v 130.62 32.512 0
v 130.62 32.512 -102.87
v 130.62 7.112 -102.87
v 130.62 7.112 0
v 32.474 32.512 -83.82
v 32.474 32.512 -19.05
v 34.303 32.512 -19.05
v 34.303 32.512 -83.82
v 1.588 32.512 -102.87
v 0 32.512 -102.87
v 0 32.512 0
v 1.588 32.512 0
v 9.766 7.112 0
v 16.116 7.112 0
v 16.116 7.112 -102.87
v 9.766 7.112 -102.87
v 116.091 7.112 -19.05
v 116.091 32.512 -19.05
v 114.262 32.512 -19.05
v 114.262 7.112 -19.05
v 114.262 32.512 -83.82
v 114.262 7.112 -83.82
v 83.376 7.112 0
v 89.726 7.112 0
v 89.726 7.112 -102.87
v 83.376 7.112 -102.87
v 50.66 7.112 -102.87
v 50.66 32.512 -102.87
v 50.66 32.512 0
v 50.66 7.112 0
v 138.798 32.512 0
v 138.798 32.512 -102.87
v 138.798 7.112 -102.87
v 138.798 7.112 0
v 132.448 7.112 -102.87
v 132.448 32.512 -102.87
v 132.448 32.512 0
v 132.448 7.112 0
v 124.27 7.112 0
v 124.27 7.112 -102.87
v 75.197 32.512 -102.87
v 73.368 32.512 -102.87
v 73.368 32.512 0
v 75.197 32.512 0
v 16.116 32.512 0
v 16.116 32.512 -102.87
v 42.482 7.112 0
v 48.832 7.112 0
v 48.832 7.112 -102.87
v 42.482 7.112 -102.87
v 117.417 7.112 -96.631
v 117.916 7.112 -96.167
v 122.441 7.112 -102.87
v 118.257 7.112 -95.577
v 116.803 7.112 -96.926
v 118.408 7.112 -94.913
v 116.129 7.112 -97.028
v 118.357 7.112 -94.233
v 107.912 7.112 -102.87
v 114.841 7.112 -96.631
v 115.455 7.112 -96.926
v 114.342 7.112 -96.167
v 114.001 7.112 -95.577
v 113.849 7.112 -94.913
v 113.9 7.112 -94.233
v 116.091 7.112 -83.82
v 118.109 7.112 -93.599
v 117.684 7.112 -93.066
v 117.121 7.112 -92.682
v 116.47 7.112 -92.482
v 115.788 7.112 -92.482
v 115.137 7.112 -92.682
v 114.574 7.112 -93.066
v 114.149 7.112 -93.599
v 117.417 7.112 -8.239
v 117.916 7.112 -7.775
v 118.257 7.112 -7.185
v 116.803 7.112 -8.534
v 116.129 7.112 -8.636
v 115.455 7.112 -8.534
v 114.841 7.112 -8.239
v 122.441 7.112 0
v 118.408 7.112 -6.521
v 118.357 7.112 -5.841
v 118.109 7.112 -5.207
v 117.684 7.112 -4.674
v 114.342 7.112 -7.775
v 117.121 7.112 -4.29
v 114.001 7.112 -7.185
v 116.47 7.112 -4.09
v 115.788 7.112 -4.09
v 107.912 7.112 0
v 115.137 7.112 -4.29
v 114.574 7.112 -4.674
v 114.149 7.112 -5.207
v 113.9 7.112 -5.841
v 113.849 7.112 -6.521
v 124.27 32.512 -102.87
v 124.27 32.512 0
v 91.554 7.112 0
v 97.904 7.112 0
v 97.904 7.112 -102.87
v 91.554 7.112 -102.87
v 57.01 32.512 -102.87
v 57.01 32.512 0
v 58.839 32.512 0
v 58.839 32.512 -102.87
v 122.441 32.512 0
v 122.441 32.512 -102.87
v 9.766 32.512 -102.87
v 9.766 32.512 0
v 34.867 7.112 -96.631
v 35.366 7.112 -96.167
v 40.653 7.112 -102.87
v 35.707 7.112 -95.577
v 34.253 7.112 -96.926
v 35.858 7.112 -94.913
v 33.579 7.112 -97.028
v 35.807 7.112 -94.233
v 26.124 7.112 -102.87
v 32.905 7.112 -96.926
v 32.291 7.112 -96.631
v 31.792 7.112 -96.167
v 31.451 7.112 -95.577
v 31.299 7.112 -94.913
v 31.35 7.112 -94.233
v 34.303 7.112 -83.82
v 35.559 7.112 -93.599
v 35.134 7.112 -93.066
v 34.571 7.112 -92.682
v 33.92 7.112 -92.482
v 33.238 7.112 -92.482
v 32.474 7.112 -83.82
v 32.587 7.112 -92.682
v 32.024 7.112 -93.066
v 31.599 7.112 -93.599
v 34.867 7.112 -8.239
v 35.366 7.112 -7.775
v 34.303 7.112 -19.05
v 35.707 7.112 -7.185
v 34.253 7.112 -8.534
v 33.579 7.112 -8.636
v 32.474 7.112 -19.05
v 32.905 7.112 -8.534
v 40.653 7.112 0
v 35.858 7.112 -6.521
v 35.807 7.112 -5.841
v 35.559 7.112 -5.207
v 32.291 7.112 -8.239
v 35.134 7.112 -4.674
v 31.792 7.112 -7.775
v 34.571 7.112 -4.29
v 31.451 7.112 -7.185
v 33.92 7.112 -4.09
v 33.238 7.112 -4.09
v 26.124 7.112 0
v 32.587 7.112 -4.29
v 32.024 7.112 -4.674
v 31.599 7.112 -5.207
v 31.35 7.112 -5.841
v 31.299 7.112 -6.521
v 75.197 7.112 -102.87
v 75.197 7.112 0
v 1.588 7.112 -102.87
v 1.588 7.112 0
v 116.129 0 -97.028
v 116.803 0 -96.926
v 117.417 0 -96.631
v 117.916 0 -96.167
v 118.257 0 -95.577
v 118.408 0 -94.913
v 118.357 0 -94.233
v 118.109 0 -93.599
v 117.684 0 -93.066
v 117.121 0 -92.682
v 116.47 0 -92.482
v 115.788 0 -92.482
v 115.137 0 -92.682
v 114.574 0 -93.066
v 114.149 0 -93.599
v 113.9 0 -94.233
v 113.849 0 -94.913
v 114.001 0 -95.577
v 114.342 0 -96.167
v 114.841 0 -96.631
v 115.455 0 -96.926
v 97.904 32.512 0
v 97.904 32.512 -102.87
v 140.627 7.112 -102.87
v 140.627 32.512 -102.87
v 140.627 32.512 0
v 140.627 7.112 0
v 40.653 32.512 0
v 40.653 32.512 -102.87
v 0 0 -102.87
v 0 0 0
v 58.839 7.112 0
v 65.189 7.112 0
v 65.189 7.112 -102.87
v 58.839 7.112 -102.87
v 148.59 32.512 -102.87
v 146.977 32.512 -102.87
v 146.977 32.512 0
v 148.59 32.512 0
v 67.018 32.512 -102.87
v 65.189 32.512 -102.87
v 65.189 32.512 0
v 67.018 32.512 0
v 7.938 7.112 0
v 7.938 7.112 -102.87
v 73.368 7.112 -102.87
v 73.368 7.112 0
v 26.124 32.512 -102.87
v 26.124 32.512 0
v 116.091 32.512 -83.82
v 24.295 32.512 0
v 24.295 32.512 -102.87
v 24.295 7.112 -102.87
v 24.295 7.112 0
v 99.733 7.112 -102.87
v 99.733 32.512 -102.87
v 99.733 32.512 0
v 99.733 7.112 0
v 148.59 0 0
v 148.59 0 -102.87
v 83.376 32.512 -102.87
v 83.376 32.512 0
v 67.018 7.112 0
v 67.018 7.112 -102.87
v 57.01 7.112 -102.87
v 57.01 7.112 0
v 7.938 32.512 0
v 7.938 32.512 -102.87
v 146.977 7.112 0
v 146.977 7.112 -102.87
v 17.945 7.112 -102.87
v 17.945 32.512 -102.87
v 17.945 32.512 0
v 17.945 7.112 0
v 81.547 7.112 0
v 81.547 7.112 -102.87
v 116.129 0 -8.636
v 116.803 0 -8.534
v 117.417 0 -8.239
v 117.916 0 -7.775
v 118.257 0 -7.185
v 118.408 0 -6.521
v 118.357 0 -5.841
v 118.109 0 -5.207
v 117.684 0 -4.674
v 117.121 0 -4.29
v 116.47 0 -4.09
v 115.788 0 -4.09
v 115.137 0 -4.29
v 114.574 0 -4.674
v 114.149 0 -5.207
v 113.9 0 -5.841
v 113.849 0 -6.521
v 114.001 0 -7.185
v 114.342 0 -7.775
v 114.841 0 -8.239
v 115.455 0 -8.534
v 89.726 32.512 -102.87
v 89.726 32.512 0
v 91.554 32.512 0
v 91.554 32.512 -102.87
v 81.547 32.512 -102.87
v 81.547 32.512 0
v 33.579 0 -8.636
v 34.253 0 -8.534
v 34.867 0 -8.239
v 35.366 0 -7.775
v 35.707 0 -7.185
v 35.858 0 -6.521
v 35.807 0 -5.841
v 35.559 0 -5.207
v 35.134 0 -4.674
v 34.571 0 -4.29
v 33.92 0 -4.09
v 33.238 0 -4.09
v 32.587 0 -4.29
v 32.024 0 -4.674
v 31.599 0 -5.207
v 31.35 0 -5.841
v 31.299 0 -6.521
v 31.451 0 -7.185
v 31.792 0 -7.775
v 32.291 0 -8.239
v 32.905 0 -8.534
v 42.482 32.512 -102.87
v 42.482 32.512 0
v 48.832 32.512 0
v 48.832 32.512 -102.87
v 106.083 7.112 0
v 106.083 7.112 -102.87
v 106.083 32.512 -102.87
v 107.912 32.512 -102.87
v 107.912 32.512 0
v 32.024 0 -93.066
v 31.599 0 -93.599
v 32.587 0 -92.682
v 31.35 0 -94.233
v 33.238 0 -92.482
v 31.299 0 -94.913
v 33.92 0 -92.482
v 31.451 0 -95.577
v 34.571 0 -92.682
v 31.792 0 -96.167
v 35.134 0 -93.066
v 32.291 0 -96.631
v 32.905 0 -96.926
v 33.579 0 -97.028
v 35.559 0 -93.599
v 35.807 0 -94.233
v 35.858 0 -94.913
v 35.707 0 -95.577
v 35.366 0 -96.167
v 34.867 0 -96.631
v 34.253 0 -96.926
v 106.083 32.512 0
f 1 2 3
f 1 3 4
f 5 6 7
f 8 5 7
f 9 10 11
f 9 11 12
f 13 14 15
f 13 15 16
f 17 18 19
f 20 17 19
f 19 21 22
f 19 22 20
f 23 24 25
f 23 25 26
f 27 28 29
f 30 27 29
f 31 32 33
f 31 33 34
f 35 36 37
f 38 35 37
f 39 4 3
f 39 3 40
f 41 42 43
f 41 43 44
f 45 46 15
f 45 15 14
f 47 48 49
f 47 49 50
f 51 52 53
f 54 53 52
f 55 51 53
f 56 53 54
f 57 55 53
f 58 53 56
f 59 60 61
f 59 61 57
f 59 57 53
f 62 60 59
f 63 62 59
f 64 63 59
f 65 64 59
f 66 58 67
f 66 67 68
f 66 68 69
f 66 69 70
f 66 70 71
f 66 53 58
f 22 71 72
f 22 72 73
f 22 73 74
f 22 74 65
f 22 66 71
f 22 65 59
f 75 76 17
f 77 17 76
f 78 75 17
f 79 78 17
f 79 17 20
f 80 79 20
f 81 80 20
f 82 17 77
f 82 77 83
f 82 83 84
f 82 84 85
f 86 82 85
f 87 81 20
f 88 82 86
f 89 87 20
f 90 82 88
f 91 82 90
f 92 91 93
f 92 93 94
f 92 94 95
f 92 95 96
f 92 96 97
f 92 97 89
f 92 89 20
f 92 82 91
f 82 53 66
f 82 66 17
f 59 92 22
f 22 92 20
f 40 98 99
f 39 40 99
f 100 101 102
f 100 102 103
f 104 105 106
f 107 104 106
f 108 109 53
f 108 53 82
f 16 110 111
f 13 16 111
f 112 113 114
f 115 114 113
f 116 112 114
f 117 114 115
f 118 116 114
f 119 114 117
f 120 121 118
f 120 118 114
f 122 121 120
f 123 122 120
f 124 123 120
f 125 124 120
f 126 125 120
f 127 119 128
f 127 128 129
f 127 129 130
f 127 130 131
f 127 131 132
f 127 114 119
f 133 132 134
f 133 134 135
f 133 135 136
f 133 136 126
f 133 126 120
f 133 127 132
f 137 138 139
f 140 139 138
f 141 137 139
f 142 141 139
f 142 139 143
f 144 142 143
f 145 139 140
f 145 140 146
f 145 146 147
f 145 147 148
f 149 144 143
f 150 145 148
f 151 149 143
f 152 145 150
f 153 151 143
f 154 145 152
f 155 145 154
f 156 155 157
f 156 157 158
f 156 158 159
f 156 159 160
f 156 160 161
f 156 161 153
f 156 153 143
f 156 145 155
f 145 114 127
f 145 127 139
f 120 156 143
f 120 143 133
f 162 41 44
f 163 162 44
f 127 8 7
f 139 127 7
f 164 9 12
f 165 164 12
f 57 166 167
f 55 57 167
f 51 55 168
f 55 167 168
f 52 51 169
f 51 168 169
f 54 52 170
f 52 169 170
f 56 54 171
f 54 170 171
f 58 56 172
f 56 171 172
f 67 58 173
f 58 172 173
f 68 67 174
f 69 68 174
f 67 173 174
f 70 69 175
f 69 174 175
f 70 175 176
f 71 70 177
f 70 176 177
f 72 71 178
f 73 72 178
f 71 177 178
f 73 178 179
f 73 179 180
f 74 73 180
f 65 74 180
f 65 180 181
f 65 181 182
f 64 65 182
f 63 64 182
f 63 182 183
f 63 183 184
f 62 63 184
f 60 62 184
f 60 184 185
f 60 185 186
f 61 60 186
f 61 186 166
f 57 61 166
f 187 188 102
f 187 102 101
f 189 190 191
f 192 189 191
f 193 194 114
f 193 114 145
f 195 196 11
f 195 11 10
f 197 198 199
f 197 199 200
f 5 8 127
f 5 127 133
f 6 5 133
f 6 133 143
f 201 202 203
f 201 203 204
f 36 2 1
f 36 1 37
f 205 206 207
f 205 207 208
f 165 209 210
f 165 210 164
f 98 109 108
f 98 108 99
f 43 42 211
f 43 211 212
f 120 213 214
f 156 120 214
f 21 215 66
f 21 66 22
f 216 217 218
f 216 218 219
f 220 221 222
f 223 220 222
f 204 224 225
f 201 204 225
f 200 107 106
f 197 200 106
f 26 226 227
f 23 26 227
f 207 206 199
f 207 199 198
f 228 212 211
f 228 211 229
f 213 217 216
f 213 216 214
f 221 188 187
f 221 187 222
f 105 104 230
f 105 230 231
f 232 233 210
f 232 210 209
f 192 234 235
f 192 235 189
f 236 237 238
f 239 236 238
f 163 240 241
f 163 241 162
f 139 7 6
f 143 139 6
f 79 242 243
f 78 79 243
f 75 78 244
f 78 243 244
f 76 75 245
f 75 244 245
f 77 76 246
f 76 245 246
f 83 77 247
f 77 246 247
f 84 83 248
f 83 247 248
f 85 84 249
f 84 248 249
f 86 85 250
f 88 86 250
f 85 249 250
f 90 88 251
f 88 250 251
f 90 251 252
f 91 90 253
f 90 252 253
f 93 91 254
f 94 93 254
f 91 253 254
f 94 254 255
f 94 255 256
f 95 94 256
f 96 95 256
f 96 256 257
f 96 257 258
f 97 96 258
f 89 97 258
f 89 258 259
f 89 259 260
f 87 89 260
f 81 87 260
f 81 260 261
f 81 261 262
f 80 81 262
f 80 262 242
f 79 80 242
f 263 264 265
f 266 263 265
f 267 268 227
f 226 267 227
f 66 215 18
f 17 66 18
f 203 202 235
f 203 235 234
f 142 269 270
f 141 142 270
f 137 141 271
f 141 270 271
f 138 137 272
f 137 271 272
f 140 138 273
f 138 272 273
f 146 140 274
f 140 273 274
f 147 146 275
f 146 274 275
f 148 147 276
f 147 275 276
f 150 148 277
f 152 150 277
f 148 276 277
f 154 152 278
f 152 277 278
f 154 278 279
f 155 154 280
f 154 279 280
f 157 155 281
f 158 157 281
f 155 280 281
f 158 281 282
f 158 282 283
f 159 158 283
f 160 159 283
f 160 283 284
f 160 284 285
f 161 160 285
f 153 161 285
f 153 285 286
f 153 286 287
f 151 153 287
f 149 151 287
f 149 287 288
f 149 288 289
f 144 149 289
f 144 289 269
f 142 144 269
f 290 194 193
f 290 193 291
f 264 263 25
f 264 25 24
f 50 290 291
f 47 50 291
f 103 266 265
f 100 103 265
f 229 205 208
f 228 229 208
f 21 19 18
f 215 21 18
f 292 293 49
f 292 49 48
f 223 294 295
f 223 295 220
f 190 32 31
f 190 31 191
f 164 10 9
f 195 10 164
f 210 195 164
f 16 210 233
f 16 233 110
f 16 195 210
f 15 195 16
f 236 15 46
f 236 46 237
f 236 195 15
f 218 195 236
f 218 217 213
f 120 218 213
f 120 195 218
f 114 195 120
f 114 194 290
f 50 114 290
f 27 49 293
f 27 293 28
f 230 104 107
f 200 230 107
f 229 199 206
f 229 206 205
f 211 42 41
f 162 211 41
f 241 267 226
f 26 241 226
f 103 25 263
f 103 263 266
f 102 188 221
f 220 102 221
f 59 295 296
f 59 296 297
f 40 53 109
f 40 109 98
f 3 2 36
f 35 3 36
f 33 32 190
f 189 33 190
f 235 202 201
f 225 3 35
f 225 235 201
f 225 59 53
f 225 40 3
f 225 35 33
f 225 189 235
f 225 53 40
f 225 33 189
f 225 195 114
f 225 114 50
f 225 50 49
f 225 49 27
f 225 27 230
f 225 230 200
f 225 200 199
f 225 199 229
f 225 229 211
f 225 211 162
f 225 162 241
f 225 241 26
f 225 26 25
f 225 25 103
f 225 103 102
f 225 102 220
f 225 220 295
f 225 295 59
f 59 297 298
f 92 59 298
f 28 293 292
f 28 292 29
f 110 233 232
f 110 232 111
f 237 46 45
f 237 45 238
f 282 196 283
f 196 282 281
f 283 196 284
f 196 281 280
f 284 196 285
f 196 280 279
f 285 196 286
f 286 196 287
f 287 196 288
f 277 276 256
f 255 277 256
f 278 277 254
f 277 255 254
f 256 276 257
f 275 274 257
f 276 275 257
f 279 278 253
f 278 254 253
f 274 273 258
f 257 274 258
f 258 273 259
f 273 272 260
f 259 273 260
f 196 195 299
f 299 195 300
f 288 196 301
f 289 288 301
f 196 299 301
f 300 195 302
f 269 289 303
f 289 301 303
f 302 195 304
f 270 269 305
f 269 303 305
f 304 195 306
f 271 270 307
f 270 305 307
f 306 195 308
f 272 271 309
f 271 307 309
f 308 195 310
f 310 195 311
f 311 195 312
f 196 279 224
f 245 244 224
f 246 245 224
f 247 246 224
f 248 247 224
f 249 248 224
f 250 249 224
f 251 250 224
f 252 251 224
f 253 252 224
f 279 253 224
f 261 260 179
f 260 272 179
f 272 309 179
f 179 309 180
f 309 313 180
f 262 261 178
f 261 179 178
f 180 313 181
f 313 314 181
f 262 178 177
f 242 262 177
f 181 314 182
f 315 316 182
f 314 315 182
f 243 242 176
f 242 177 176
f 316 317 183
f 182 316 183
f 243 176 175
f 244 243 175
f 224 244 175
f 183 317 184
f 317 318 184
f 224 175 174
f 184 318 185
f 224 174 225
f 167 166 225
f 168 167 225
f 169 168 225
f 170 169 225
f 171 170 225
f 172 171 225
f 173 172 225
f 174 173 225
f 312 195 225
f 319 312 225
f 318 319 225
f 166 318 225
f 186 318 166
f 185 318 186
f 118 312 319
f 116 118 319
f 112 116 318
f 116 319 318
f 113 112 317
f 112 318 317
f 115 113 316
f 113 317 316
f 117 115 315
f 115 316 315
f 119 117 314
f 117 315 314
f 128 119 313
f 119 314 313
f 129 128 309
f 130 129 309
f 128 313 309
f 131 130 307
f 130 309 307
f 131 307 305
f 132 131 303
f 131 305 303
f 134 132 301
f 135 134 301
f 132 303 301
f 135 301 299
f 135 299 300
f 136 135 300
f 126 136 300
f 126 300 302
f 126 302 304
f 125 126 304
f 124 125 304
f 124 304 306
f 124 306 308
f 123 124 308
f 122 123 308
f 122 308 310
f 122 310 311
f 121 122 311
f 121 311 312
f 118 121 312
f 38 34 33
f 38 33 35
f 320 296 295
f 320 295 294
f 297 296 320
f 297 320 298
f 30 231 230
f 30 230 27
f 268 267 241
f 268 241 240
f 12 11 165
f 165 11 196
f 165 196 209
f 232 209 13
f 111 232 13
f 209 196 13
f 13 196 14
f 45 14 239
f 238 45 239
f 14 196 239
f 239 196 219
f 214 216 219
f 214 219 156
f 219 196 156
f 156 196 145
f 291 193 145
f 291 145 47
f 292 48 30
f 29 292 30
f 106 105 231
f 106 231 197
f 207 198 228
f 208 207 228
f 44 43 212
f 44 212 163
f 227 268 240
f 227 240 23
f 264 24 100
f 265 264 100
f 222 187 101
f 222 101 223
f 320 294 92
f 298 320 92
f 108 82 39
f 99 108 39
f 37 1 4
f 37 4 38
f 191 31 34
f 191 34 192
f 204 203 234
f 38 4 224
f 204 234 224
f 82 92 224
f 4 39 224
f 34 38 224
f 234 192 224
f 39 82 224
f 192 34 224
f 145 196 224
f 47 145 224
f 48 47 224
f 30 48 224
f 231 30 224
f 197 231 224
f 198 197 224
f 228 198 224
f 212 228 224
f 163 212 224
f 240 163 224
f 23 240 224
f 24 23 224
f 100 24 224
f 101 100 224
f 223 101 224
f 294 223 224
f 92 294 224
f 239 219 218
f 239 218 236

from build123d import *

# Parameters (mm, degrees)
SKETCH1_W          = 148.59
SKETCH1_H          = 102.87
EXTRUDE1_DEPTH     = 32.512
SKETCH2_W          = 6.35
SKETCH2_H          = 102.87
CUT_EXTRUDE1_DEPTH = 25.4
LPATTERN1_COUNT    = 18
LPATTERN1_PITCH    = 8.1788
SKETCH3_R          = 2.286
CUT_EXTRUDE2_DEPTH = 78.74
SKETCH4_W          = 1.8288
SKETCH4_H          = 19.05
CUT_EXTRUDE3_DEPTH = 25.4


with BuildPart() as part:
    # Sketch1 → Extrude1 (new body)
    with BuildSketch(Plane(origin=(0, 0, 0), x_dir=(1, 0, 0), z_dir=(0, 1, 0))):
        with Locations((74.295, 51.435)):
            Rectangle(SKETCH1_W, SKETCH1_H)
    extrude(amount=EXTRUDE1_DEPTH)

    # Sketch2 → Cut-Extrude1 (cut)
    with BuildSketch(Plane(origin=(0, 32.512, 0), x_dir=(-1, 0, 0), z_dir=(0, 1, 0))):
        with Locations((-4.7625, -51.435)):
            Rectangle(SKETCH2_W, SKETCH2_H)
    cut_extrude1 = extrude(amount=-CUT_EXTRUDE1_DEPTH, mode=Mode.SUBTRACT)

    # LPattern1: Cut-Extrude1 ×18
    with Locations(*[(i * LPATTERN1_PITCH, 0, 0) for i in range(1, LPATTERN1_COUNT)]):
        add(cut_extrude1, mode=Mode.SUBTRACT)

    # Sketch3 → Cut-Extrude2 (cut)
    with BuildSketch(Plane.XZ):
        with Locations(Location((33.5788, -6.35, 0), (0, 0, 270))):
            Circle(SKETCH3_R)
        with Locations(Location((33.5788, -94.742, 0), (0, 0, 270))):
            Circle(SKETCH3_R)
        with Locations(Location((116.1288, -6.35, 0), (0, 0, 270))):
            Circle(SKETCH3_R)
        with Locations(Location((116.1288, -94.742, 0), (0, 0, 270))):
            Circle(SKETCH3_R)
    extrude(amount=-CUT_EXTRUDE2_DEPTH, mode=Mode.SUBTRACT)

    # Sketch4 → Cut-Extrude3 (cut)
    with BuildSketch(Plane(origin=(0, 32.512, 0), x_dir=(-1, 0, 0), z_dir=(0, 1, 0))):
        with Locations((-33.3883, -93.345)):
            Rectangle(SKETCH4_W, SKETCH4_H)
        with Locations((-115.1763, -93.345)):
            Rectangle(SKETCH4_W, SKETCH4_H)
        with Locations((-33.3883, -9.525)):
            Rectangle(SKETCH4_W, SKETCH4_H)
        with Locations((-115.1763, -9.525)):
            Rectangle(SKETCH4_W, SKETCH4_H)
    extrude(amount=-CUT_EXTRUDE3_DEPTH, mode=Mode.SUBTRACT)


solid = part.part
